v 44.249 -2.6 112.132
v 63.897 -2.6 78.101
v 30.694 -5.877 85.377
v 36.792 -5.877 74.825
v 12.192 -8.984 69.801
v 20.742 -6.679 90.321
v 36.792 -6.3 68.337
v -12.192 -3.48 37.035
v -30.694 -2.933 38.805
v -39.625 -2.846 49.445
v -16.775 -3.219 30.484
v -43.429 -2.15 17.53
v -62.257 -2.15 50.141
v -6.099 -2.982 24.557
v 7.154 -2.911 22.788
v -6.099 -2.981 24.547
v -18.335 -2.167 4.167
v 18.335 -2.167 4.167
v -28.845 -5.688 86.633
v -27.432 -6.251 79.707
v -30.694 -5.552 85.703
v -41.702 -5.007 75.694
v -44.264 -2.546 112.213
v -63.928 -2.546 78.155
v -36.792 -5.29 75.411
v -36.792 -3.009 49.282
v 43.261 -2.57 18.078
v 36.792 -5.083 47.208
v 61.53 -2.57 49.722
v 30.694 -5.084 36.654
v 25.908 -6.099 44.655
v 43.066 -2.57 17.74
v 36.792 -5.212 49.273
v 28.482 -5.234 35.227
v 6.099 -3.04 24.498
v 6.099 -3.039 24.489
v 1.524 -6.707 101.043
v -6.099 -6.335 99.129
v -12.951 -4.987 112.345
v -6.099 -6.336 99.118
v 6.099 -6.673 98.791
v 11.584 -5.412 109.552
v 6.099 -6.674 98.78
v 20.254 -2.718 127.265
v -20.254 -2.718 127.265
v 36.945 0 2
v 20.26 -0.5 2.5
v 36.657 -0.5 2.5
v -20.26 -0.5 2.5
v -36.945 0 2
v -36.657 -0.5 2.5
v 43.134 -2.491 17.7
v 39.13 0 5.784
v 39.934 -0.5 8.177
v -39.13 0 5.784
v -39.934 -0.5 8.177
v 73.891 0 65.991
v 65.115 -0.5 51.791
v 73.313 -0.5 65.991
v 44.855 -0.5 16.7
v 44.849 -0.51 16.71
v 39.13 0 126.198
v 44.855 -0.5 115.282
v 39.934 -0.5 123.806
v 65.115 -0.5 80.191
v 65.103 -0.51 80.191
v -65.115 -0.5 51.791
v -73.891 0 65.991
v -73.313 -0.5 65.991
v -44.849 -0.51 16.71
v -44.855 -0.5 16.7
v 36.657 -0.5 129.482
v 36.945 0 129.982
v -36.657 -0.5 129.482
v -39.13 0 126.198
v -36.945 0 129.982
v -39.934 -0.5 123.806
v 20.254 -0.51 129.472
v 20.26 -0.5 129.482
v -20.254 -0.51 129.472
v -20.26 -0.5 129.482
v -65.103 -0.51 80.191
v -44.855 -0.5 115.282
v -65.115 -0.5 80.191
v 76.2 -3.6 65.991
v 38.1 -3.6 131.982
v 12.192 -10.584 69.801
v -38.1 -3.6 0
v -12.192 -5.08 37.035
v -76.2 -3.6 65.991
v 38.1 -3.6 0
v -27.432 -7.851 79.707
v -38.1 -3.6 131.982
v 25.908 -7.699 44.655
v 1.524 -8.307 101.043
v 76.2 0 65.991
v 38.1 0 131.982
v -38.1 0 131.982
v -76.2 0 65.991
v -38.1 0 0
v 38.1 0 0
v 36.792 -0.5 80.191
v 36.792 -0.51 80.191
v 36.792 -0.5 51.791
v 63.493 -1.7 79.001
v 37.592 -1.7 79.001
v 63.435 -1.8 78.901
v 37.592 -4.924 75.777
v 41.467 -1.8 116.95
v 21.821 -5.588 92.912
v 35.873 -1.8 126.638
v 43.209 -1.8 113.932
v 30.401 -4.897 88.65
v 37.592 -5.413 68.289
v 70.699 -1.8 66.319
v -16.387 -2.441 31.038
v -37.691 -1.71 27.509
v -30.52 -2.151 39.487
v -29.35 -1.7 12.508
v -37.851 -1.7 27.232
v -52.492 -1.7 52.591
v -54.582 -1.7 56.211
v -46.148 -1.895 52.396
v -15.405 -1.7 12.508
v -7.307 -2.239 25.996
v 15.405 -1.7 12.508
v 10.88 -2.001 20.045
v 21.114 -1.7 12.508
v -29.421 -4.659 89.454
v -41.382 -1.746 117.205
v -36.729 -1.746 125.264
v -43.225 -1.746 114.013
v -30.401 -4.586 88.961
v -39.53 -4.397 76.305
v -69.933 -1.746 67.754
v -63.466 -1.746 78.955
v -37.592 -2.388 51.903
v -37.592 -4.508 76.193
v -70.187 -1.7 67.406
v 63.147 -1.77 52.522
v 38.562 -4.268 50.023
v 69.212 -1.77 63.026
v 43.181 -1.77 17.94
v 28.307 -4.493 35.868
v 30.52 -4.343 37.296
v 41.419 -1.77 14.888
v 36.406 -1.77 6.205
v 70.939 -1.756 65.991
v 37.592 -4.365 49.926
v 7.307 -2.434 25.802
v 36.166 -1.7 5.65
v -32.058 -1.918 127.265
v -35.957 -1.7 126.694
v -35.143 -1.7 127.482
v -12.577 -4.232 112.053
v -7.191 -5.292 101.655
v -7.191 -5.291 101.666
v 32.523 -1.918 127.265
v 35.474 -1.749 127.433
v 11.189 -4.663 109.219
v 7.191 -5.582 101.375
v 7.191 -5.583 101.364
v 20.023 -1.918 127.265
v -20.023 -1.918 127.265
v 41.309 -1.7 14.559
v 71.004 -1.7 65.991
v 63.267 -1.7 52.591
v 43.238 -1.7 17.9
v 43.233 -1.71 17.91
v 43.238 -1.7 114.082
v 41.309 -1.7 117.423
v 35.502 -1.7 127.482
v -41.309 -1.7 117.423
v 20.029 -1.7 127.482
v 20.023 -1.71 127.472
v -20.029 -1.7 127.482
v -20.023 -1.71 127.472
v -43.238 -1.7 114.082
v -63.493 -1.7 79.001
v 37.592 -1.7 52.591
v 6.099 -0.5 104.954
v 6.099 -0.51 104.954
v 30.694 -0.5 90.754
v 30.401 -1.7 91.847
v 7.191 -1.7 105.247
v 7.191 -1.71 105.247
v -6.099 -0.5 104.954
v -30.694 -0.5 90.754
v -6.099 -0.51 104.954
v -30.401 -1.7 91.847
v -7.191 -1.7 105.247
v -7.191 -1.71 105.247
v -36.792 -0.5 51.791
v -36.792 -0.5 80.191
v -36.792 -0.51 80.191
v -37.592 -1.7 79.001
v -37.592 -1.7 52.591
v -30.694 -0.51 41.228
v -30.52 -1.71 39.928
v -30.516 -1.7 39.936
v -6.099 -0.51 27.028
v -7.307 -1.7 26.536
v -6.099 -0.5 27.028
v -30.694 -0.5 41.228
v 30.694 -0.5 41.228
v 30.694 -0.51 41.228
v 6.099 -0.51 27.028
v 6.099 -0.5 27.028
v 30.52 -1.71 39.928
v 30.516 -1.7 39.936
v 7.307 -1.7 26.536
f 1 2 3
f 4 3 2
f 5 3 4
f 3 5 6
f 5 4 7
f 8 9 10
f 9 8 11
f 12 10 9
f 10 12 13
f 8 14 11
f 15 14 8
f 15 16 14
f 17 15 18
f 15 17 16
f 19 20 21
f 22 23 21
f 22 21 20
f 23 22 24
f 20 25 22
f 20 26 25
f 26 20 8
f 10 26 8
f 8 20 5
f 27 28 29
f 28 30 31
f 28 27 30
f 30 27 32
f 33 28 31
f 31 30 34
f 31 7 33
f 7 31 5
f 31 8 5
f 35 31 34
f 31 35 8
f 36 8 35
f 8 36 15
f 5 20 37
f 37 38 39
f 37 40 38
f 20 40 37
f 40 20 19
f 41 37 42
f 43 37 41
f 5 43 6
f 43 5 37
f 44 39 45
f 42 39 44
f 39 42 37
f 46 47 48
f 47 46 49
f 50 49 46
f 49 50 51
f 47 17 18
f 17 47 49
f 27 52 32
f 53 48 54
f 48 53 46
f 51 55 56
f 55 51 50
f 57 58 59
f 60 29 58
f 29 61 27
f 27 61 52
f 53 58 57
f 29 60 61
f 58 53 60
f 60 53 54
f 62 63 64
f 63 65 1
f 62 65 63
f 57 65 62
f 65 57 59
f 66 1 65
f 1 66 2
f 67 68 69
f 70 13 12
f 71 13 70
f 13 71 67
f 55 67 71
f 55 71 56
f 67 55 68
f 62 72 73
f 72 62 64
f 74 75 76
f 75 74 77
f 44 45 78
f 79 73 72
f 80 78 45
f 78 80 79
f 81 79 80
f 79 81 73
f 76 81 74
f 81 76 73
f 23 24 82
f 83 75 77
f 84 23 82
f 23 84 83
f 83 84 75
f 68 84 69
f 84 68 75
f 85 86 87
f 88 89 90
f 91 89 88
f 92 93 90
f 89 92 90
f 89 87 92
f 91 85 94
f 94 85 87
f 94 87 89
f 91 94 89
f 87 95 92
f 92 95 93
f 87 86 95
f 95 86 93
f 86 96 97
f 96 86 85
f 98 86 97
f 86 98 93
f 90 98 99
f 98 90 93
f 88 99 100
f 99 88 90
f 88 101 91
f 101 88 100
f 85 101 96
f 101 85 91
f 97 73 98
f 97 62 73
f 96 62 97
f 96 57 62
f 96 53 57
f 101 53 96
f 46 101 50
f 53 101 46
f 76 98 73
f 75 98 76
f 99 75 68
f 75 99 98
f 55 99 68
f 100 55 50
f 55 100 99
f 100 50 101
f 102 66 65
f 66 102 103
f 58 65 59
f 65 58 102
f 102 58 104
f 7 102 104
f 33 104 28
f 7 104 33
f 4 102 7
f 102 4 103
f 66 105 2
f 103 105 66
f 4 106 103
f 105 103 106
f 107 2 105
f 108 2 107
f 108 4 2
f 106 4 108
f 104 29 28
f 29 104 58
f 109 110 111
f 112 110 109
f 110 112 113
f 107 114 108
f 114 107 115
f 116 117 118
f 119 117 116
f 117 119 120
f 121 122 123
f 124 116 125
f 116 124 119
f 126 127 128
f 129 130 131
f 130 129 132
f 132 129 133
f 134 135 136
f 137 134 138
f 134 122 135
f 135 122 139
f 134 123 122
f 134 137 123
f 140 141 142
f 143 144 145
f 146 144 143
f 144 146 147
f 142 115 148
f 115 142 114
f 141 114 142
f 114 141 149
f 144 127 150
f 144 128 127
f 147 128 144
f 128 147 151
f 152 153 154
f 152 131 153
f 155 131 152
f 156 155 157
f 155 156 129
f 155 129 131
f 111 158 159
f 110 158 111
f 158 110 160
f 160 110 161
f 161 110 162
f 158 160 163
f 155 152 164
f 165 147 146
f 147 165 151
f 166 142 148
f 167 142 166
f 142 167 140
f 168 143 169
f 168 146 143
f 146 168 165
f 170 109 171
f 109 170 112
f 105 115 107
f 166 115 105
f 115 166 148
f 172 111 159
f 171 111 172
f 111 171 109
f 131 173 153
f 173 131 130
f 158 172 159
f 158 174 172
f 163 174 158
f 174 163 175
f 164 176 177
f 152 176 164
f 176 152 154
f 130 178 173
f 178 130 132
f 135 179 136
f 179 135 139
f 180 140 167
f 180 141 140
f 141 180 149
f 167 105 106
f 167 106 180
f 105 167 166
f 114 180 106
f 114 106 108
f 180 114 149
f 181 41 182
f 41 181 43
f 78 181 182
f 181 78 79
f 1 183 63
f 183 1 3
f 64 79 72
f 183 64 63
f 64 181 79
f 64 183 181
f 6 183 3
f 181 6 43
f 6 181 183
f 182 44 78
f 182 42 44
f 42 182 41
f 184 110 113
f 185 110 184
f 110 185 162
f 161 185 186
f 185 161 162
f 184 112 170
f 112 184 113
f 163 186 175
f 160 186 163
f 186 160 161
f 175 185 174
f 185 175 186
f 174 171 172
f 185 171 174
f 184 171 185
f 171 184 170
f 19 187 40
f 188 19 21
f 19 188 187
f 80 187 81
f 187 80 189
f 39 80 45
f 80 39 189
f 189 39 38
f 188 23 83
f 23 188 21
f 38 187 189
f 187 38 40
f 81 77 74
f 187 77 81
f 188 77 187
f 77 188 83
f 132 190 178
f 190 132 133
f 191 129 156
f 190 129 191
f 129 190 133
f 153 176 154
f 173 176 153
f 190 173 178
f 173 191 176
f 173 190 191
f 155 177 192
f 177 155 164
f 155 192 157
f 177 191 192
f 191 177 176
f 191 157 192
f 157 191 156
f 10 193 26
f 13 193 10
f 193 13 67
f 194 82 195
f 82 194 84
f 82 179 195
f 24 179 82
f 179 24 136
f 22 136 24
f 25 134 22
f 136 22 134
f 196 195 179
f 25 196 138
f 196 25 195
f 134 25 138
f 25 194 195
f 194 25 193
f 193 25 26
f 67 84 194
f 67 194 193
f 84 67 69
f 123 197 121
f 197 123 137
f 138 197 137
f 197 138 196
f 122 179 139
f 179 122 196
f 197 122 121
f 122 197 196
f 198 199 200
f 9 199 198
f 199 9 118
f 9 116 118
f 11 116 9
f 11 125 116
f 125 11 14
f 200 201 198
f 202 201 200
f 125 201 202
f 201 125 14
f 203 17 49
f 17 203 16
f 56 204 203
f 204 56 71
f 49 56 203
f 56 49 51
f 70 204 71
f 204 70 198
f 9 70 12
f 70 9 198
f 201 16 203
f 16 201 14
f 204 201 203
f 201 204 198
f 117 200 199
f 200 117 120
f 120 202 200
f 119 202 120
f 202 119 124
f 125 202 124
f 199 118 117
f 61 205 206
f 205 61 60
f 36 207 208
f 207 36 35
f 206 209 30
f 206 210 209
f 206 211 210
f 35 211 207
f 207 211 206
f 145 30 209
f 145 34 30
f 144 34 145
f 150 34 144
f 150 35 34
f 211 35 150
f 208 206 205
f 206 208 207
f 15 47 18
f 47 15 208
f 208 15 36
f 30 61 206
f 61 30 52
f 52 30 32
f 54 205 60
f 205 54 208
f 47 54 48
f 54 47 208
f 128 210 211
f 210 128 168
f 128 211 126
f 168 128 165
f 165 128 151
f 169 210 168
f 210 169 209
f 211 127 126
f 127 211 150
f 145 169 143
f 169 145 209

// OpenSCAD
// Hexagon wall tile v31 — parametric rebuild of v30
// Front: identical low-poly facets to v30 (same facet angles at every size).
// Edge profile: identical on every size (edge depth, rim width) so tiles butt flush.
// Back: six corner pads for 1" (25 mm) double-sided mounting tape.
// Prints upright on a flat edge with NO supports (all internal overhangs are 45° chamfers).
//
// Export one size at a time, e.g.:
//   openscad -D size_in=6 -o hex_tile_v31_6in.stl hex_wall_tile_v31.scad

/* [Size] */
size_in       = 6;      // point-to-point width in inches (3, 6, 10 ...)

/* [Edge profile — keep identical across sizes] */
edge_depth    = 3.6;    // depth of the outer edge, back plane to front face (mm)
rim           = 2.0;    // perimeter wall thickness at the back plane (mm)

/* [Front skin] */
skin          = 1.6;    // front skin thickness (mm) — 4 lines at 0.4 mm, same on all sizes

/* [Tape pads] */
tape_width    = 25.4;   // tape width (mm)
pad_margin    = 3;      // extra pad width beyond the tape (mm)
pad_max_frac  = 0.45;   // pad never larger than this fraction of the tile radius (keeps 3" usable)
pad_plate     = 1.2;    // thickness of the flat pad face (mm)
pad_wall      = 0.8;    // pad side-wall thickness (mm)
pad_recess    = 0.5;    // pads sit this far behind the rim so the rim meets the wall
                        // (use 0 for very thin tape; foam tape is ~1–1.6 mm)

/* [Output] */
orient_for_print = true; // stand upright on a flat edge, back facing +Y

/* [Hidden] */
R   = size_in * 25.4 / 2;         // corner radius
AP  = R * cos(30);                // apothem
PAD = min(tape_width + pad_margin, R * pad_max_frac);

// Normalised front geometry from v30 (x, y in units of R; z = relief above edge, units of R)
FP = [[1,0,0],[0.5,0.866025,0],[-0.5,0.866025,0],[-1,0,0],[-0.5,-0.866025,0],[0.5,-0.866025,0],
      [0.16,0.05,0.091654],[-0.16,-0.38,0.019428],[-0.36,0.18,0.05579],[0.34,-0.28,0.053795],[0.02,0.46,0.061766]];
FACES = [[0,6,1],[4,3,7],[5,4,7],[8,3,2],[7,3,8],[7,8,6],[5,9,0],[9,6,0],[9,7,6],[5,7,9],
         [6,8,10],[8,2,10],[6,10,1],[10,2,1],
         [1,12,11,0],[2,13,12,1],[3,14,13,2],[4,15,14,3],[5,16,15,4],[0,11,16,5],
         [11,12,13,14,15,16]];
RELIEF_MAX = 0.091654 * R;
D = edge_depth + RELIEF_MAX + 1;  // max depth used for chamfers

// Solid bounded by the faceted front (shifted by dz) and a flat back at z = zb
module body(dz = 0, zb = 0) {
    pts = concat(
        [for (p = FP) [p[0]*R, p[1]*R, edge_depth + p[2]*R + dz]],
        [for (i = [0:5]) [FP[i][0]*R, FP[i][1]*R, zb]]);
    polyhedron(points = pts, faces = FACES, convexity = 4);
}

module hex2d(apothem) { circle(r = apothem / cos(30), $fn = 6); }

// Back cavity: behind the skin, inside the rim; rim inner faces slope 45° so nothing needs support
module cavity(extra = 0) {
    H  = D + 2;
    a0 = AP - rim - extra + 1;             // apothem at z = -1
    intersection() {
        body(dz = -skin - extra, zb = -1);
        translate([0, 0, -1]) linear_extrude(height = H, scale = (a0 - H) / a0) hex2d(a0);
    }
}

// Corner pad footprint (2D), k = corner index 0..5
module pad_fp(k) {
    U0 = R - rim / sin(60);                // inner corner distance from centre
    uo = U0 - PAD / (2 * sqrt(3)) - 0.5;   // outer edge of the square
    intersection() {
        hex2d(AP - rim);
        rotate(60 * k) hull() {
            translate([uo - PAD, -PAD / 2]) square([PAD, PAD]);
            translate([U0 - 0.01, 0]) circle(r = 0.01, $fn = 8);
        }
    }
}

// Sweep a footprint from the back plane toward the front, sliding 1:1 "down" (−Y) → 45° undersides
module chamfer_sweep(z0) {
    hull() {
        translate([0, 0, z0]) linear_extrude(0.01) children();
        translate([0, -D, z0 + D]) linear_extrude(0.01) children();
    }
}

module pads() {
    for (k = [0:5]) difference() {
        intersection() { body(); chamfer_sweep(pad_recess) pad_fp(k); }
        intersection() { cavity(pad_wall); chamfer_sweep(pad_recess + pad_plate) offset(delta = -pad_wall) pad_fp(k); }
    }
}

module tile() {
    union() {
        difference() { body(); cavity(); }
        pads();
    }
}

if (orient_for_print)
    translate([0, 0, AP]) rotate([90, 0, 0]) tile();
else
    tile();
